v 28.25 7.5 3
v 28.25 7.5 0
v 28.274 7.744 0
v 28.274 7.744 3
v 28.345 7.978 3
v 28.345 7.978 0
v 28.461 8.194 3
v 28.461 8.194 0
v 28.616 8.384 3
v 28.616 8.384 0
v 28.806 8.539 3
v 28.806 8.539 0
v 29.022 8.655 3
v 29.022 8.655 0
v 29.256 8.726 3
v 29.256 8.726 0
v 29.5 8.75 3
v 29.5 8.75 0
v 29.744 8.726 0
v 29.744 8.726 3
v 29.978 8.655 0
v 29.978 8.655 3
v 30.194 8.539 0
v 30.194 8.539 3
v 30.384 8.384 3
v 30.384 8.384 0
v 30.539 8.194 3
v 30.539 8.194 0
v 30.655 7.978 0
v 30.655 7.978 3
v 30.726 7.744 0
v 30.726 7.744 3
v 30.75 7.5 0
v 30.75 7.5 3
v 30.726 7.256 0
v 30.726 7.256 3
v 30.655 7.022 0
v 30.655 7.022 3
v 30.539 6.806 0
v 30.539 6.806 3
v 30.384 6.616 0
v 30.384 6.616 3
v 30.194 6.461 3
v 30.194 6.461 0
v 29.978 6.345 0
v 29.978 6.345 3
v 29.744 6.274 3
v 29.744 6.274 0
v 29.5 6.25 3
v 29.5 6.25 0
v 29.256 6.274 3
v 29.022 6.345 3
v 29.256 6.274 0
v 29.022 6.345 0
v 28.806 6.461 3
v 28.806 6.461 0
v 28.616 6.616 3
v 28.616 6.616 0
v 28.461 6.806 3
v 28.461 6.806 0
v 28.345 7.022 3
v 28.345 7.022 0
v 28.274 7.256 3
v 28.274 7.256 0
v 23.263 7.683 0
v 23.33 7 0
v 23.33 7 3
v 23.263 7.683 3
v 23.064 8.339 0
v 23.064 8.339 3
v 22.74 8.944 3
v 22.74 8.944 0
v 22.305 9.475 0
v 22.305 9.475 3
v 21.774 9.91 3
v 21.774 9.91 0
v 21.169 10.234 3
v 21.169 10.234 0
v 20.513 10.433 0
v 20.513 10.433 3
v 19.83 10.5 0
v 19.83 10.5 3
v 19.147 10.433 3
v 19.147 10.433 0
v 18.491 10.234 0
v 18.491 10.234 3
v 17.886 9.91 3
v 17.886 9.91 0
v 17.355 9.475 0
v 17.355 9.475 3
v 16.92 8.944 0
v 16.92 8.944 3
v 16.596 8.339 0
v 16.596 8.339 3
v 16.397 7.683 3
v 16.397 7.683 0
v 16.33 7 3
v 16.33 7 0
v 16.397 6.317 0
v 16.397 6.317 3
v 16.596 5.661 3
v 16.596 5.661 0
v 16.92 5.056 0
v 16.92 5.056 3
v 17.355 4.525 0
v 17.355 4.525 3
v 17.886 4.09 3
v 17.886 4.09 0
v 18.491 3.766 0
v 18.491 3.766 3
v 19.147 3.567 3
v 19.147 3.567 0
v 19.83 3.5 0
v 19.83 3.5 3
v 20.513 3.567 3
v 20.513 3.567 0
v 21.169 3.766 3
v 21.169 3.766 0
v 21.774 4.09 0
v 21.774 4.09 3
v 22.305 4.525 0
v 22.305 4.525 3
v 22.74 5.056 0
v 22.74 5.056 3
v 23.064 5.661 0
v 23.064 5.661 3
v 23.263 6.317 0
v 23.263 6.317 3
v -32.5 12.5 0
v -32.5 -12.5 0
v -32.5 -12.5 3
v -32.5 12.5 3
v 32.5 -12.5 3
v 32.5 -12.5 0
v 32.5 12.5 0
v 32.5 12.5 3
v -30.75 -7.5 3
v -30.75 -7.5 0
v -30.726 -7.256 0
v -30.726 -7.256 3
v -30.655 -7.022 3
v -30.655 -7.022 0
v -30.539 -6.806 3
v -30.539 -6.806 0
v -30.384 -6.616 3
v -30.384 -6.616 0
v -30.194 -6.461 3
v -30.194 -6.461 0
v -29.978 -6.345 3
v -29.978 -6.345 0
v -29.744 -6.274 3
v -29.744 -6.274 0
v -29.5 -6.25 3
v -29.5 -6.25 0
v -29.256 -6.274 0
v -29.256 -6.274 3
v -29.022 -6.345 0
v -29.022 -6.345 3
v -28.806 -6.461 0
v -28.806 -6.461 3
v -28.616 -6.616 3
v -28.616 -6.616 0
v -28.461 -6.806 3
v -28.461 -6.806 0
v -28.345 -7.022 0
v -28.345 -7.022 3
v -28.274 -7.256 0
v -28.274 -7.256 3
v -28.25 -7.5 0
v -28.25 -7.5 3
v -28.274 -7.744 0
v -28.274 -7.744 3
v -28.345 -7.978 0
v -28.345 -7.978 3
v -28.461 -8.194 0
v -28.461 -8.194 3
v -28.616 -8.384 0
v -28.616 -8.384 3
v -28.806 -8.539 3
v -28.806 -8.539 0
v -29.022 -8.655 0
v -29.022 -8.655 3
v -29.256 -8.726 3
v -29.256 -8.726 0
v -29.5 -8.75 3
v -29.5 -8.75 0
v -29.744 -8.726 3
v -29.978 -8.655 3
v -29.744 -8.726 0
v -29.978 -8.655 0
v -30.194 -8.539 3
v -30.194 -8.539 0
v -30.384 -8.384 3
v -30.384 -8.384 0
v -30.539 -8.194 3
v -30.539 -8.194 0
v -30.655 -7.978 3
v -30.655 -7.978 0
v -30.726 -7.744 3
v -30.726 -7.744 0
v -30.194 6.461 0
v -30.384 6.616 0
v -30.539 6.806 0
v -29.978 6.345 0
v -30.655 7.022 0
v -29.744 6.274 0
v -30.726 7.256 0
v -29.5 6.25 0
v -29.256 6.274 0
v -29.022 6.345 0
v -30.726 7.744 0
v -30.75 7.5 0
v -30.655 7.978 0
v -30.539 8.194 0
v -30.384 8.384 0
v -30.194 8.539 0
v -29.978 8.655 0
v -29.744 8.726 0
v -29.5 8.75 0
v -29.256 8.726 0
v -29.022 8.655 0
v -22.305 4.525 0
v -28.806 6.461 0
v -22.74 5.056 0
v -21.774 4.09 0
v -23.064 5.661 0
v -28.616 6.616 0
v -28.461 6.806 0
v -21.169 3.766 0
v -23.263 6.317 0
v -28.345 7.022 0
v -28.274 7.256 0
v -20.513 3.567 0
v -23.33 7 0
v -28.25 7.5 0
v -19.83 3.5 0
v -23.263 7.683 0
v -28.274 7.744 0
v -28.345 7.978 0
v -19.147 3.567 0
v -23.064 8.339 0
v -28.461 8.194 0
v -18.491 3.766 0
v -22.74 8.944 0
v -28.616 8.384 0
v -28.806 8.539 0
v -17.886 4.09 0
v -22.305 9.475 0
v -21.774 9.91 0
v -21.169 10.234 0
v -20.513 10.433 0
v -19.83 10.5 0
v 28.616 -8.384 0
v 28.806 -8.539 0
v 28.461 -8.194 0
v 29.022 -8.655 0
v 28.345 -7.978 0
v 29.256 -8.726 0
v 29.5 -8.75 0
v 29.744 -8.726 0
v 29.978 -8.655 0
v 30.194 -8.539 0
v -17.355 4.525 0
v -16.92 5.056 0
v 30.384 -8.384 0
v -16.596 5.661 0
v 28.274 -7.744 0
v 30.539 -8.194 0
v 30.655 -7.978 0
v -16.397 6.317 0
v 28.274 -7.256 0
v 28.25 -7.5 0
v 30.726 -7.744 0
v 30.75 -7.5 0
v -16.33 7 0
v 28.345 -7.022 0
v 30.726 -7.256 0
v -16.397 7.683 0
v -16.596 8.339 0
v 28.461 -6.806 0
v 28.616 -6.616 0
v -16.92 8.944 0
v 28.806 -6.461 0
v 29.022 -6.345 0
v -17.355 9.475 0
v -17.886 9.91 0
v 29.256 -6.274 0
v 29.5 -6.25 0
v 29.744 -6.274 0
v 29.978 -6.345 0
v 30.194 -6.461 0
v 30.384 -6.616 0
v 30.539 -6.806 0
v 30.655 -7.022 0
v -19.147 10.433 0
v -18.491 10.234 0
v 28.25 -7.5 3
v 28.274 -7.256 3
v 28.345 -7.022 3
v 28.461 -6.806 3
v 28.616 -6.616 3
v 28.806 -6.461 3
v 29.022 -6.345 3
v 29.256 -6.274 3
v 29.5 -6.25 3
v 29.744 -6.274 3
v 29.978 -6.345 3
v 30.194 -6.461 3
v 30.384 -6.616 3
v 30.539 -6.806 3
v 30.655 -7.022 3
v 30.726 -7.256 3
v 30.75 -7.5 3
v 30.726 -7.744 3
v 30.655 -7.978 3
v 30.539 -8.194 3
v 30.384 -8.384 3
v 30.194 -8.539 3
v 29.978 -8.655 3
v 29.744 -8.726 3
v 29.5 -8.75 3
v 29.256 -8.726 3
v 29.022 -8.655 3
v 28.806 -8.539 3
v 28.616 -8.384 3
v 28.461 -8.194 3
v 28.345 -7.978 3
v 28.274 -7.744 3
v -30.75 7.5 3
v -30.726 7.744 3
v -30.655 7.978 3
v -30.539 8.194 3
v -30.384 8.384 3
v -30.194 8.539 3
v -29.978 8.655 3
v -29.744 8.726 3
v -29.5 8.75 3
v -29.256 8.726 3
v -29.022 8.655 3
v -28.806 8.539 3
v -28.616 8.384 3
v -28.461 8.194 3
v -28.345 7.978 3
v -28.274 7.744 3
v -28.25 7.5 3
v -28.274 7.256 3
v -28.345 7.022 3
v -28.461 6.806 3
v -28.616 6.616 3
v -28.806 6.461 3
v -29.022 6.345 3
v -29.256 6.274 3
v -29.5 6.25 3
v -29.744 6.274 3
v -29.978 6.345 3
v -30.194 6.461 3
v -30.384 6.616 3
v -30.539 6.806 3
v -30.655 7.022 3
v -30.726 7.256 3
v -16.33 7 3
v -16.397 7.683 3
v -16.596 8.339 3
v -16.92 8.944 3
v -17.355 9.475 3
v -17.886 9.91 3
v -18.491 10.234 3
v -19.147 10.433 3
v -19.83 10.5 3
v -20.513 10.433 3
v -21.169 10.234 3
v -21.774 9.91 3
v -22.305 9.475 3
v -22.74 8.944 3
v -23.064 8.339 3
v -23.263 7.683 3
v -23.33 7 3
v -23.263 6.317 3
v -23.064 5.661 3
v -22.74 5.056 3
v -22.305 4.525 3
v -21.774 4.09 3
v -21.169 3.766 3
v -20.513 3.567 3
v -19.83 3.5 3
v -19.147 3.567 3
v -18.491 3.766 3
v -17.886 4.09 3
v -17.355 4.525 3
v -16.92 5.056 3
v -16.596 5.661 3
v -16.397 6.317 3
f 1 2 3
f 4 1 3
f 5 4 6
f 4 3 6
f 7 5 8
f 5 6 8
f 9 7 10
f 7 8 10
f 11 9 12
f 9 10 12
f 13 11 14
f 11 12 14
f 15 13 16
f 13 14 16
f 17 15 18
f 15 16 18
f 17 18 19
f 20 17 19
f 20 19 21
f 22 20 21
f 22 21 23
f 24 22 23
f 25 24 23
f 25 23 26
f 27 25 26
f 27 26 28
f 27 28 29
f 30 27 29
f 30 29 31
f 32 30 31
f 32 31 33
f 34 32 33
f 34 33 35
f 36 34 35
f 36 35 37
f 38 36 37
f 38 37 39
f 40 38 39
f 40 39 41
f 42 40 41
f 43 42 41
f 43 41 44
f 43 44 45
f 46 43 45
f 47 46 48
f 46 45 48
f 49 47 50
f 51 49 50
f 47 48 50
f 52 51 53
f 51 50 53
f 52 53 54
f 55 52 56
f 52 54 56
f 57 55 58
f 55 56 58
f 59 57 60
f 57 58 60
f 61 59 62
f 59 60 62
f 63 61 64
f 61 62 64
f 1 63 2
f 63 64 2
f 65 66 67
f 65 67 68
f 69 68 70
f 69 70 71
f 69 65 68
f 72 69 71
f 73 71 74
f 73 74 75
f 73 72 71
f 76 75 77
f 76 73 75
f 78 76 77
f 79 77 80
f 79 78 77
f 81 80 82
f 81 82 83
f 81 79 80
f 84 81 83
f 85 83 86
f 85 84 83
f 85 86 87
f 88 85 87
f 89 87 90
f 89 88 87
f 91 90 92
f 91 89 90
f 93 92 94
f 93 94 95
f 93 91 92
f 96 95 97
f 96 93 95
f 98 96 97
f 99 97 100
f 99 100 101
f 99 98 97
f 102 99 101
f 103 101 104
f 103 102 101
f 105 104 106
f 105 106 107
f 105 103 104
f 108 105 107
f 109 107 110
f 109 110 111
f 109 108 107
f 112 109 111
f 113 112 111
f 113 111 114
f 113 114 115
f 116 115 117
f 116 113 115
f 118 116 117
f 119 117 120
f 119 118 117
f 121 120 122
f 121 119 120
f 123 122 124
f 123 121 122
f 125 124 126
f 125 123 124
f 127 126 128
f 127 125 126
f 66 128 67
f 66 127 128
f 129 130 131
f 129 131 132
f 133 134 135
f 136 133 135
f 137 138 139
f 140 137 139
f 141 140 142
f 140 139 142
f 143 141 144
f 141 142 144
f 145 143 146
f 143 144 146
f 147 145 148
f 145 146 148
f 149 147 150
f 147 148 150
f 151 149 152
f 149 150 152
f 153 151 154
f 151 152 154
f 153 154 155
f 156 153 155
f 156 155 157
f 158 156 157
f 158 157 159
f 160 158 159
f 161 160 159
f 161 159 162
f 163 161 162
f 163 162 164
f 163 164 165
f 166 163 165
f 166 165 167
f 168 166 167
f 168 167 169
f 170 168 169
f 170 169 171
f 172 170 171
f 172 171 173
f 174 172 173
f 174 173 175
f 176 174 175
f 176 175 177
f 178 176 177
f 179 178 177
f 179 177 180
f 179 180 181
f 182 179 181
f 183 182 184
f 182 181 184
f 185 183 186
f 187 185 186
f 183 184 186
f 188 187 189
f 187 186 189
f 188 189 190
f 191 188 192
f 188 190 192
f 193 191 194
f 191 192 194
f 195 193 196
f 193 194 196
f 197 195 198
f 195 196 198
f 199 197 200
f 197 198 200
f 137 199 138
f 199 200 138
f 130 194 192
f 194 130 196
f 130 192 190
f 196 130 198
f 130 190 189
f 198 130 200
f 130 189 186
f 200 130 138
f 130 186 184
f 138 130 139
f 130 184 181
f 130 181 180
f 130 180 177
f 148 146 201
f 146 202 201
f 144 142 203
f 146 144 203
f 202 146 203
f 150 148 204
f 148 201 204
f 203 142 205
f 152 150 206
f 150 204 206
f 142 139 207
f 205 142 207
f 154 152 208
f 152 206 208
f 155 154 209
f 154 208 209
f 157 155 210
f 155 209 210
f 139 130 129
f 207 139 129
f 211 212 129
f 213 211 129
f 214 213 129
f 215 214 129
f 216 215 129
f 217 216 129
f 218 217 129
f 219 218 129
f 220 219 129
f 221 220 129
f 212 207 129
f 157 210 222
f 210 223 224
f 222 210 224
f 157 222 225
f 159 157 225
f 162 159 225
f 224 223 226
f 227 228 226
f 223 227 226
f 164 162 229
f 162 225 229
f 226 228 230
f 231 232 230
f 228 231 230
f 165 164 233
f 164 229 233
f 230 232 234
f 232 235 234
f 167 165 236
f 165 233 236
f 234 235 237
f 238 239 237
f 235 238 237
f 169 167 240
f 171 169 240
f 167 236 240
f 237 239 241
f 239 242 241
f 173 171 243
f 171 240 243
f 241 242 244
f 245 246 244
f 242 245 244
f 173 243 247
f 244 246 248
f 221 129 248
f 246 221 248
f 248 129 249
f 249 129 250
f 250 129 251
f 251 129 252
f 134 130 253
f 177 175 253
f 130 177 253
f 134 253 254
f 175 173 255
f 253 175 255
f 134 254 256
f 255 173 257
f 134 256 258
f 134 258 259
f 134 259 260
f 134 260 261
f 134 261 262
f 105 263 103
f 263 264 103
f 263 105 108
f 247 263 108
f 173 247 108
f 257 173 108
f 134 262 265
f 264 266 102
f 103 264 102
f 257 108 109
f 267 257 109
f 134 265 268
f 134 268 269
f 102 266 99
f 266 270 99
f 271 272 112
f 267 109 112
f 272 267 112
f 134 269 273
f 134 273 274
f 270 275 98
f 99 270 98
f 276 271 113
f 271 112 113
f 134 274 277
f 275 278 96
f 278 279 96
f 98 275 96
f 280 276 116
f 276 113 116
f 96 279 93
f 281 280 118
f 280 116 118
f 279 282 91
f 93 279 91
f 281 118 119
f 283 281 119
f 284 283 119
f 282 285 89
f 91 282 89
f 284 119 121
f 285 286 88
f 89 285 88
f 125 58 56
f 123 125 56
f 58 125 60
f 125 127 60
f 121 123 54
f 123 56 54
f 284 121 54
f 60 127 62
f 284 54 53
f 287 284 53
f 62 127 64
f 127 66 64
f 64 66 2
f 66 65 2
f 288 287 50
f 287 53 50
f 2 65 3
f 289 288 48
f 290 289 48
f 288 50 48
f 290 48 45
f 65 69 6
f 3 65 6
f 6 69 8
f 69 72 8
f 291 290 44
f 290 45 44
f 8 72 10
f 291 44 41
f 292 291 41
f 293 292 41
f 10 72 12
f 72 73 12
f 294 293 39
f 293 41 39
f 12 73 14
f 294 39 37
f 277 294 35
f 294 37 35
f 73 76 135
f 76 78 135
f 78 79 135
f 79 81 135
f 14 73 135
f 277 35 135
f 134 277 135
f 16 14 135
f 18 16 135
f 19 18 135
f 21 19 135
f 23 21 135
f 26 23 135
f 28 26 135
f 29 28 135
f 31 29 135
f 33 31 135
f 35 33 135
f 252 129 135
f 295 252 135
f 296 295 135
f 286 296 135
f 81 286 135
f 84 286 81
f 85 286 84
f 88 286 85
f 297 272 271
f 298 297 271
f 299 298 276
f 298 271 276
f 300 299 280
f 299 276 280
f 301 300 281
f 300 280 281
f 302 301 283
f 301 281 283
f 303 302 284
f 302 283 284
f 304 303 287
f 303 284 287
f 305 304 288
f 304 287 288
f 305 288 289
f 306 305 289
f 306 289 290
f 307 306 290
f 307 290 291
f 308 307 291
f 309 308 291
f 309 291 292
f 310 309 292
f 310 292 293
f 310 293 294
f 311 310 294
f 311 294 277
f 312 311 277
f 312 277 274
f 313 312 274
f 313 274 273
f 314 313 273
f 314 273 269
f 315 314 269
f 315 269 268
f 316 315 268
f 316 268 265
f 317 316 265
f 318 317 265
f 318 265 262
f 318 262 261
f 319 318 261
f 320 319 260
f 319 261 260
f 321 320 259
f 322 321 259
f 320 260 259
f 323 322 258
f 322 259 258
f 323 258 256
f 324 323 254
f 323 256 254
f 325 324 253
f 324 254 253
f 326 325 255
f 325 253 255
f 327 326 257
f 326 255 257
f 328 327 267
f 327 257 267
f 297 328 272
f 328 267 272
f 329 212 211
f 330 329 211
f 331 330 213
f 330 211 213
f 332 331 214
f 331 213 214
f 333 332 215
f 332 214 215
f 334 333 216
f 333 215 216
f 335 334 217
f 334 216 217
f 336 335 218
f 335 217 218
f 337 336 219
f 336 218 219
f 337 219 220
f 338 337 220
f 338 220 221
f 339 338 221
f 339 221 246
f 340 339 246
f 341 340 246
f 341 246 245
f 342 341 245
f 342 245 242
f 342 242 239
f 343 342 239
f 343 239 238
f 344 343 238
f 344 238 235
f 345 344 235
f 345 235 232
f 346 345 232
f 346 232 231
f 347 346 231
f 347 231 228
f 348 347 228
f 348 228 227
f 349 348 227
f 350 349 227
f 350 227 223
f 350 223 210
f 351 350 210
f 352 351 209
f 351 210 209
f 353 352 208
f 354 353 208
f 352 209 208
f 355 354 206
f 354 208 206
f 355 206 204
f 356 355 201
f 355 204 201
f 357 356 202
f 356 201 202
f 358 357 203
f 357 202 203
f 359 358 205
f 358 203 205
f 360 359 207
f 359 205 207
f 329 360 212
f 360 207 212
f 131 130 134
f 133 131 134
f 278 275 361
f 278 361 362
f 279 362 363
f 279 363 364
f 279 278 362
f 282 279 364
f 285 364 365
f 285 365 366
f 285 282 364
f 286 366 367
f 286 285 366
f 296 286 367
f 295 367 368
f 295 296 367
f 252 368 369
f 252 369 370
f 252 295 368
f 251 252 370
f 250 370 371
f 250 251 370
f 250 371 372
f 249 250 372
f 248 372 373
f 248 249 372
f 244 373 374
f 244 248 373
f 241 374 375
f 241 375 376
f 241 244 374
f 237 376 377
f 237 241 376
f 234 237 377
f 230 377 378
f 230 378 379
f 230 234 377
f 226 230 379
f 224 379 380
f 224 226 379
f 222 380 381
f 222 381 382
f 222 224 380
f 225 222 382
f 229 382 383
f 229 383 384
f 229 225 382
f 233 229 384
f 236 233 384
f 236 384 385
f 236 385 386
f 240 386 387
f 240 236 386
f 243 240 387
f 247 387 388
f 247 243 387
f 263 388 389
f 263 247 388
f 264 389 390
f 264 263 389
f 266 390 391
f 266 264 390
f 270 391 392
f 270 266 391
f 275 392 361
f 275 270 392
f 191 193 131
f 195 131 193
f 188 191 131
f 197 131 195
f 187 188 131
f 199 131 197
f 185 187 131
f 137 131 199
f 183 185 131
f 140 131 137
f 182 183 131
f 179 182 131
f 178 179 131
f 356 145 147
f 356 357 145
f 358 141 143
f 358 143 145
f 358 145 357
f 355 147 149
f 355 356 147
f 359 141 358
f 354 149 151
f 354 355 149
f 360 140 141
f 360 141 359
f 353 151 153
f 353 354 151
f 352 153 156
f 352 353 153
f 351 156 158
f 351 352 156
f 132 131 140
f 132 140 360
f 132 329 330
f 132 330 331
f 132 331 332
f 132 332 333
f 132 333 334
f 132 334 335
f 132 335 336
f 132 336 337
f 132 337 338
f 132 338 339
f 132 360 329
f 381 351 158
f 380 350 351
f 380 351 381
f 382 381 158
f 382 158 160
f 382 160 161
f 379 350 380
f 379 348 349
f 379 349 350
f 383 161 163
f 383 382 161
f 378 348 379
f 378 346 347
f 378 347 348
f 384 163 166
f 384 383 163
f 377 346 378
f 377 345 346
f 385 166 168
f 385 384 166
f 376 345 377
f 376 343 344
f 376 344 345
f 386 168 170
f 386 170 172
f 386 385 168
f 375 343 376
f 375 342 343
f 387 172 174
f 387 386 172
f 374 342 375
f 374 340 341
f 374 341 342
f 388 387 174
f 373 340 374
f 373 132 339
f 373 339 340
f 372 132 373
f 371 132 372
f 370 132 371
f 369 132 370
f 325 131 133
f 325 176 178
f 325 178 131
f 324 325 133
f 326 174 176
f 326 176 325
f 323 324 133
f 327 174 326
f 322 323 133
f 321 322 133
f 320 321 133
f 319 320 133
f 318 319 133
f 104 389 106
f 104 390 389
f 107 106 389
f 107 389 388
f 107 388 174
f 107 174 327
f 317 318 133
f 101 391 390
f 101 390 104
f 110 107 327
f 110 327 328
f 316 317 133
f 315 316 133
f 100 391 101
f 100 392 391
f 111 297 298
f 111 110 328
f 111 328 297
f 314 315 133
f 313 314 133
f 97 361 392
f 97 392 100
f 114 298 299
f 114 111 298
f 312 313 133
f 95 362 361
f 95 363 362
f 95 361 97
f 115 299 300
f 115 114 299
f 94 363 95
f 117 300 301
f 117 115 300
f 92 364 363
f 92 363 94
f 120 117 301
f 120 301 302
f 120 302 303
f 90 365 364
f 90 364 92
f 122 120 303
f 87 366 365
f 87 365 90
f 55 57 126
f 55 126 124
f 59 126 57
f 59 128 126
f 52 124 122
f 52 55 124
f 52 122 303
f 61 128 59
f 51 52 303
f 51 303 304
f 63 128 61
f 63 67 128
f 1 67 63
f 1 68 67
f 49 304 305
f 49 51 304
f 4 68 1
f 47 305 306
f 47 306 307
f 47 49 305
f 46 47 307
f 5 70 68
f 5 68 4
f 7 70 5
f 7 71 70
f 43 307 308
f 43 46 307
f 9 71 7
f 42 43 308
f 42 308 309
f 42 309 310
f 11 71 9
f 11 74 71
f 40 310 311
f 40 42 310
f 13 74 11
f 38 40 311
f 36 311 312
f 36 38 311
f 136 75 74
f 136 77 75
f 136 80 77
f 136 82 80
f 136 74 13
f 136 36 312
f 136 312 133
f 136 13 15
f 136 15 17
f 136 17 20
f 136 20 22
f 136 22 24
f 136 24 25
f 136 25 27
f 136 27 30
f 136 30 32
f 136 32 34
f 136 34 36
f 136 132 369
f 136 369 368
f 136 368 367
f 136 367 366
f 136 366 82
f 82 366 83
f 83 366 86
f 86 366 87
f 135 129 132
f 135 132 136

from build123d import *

# Parameters (mm, degrees)
SKETCH_1_W      = 65
SKETCH_1_H      = 25
SKETCH_1_R      = 3.5
EXTRUDE_1_DEPTH = 3
M3X0_5_1_D      = 2.5
M3X0_5_1_DEPTH  = 8.5
M3X0_5_1_TIP    = 0.751075774


with BuildPart() as part:
    # ｽｹｯﾁ1 → ﾎﾞｽ - 押し出し1 (new body)
    with BuildSketch(Plane.XY):
        Rectangle(SKETCH_1_W, SKETCH_1_H)
        with Locations((-19.83, 7)):
            Circle(SKETCH_1_R, mode=Mode.SUBTRACT)
        with Locations((19.83, 7)):
            Circle(SKETCH_1_R, mode=Mode.SUBTRACT)
    extrude(amount=EXTRUDE_1_DEPTH)

    # M3x0.5 ねじ穴1
    with Locations(Plane(origin=(-29.5, 7.5, 3), x_dir=(1, 0, 0), z_dir=(0, 0, 1))):
        with Locations((0, 0), (0, -15), (59, 0), (59, -15)):
            Hole(M3X0_5_1_D / 2, depth=M3X0_5_1_DEPTH)
            with Locations((0, 0, -(M3X0_5_1_DEPTH + M3X0_5_1_TIP / 2))):  # 118° drill point
                Cone(0, M3X0_5_1_D / 2, M3X0_5_1_TIP, mode=Mode.SUBTRACT)


solid = part.part
